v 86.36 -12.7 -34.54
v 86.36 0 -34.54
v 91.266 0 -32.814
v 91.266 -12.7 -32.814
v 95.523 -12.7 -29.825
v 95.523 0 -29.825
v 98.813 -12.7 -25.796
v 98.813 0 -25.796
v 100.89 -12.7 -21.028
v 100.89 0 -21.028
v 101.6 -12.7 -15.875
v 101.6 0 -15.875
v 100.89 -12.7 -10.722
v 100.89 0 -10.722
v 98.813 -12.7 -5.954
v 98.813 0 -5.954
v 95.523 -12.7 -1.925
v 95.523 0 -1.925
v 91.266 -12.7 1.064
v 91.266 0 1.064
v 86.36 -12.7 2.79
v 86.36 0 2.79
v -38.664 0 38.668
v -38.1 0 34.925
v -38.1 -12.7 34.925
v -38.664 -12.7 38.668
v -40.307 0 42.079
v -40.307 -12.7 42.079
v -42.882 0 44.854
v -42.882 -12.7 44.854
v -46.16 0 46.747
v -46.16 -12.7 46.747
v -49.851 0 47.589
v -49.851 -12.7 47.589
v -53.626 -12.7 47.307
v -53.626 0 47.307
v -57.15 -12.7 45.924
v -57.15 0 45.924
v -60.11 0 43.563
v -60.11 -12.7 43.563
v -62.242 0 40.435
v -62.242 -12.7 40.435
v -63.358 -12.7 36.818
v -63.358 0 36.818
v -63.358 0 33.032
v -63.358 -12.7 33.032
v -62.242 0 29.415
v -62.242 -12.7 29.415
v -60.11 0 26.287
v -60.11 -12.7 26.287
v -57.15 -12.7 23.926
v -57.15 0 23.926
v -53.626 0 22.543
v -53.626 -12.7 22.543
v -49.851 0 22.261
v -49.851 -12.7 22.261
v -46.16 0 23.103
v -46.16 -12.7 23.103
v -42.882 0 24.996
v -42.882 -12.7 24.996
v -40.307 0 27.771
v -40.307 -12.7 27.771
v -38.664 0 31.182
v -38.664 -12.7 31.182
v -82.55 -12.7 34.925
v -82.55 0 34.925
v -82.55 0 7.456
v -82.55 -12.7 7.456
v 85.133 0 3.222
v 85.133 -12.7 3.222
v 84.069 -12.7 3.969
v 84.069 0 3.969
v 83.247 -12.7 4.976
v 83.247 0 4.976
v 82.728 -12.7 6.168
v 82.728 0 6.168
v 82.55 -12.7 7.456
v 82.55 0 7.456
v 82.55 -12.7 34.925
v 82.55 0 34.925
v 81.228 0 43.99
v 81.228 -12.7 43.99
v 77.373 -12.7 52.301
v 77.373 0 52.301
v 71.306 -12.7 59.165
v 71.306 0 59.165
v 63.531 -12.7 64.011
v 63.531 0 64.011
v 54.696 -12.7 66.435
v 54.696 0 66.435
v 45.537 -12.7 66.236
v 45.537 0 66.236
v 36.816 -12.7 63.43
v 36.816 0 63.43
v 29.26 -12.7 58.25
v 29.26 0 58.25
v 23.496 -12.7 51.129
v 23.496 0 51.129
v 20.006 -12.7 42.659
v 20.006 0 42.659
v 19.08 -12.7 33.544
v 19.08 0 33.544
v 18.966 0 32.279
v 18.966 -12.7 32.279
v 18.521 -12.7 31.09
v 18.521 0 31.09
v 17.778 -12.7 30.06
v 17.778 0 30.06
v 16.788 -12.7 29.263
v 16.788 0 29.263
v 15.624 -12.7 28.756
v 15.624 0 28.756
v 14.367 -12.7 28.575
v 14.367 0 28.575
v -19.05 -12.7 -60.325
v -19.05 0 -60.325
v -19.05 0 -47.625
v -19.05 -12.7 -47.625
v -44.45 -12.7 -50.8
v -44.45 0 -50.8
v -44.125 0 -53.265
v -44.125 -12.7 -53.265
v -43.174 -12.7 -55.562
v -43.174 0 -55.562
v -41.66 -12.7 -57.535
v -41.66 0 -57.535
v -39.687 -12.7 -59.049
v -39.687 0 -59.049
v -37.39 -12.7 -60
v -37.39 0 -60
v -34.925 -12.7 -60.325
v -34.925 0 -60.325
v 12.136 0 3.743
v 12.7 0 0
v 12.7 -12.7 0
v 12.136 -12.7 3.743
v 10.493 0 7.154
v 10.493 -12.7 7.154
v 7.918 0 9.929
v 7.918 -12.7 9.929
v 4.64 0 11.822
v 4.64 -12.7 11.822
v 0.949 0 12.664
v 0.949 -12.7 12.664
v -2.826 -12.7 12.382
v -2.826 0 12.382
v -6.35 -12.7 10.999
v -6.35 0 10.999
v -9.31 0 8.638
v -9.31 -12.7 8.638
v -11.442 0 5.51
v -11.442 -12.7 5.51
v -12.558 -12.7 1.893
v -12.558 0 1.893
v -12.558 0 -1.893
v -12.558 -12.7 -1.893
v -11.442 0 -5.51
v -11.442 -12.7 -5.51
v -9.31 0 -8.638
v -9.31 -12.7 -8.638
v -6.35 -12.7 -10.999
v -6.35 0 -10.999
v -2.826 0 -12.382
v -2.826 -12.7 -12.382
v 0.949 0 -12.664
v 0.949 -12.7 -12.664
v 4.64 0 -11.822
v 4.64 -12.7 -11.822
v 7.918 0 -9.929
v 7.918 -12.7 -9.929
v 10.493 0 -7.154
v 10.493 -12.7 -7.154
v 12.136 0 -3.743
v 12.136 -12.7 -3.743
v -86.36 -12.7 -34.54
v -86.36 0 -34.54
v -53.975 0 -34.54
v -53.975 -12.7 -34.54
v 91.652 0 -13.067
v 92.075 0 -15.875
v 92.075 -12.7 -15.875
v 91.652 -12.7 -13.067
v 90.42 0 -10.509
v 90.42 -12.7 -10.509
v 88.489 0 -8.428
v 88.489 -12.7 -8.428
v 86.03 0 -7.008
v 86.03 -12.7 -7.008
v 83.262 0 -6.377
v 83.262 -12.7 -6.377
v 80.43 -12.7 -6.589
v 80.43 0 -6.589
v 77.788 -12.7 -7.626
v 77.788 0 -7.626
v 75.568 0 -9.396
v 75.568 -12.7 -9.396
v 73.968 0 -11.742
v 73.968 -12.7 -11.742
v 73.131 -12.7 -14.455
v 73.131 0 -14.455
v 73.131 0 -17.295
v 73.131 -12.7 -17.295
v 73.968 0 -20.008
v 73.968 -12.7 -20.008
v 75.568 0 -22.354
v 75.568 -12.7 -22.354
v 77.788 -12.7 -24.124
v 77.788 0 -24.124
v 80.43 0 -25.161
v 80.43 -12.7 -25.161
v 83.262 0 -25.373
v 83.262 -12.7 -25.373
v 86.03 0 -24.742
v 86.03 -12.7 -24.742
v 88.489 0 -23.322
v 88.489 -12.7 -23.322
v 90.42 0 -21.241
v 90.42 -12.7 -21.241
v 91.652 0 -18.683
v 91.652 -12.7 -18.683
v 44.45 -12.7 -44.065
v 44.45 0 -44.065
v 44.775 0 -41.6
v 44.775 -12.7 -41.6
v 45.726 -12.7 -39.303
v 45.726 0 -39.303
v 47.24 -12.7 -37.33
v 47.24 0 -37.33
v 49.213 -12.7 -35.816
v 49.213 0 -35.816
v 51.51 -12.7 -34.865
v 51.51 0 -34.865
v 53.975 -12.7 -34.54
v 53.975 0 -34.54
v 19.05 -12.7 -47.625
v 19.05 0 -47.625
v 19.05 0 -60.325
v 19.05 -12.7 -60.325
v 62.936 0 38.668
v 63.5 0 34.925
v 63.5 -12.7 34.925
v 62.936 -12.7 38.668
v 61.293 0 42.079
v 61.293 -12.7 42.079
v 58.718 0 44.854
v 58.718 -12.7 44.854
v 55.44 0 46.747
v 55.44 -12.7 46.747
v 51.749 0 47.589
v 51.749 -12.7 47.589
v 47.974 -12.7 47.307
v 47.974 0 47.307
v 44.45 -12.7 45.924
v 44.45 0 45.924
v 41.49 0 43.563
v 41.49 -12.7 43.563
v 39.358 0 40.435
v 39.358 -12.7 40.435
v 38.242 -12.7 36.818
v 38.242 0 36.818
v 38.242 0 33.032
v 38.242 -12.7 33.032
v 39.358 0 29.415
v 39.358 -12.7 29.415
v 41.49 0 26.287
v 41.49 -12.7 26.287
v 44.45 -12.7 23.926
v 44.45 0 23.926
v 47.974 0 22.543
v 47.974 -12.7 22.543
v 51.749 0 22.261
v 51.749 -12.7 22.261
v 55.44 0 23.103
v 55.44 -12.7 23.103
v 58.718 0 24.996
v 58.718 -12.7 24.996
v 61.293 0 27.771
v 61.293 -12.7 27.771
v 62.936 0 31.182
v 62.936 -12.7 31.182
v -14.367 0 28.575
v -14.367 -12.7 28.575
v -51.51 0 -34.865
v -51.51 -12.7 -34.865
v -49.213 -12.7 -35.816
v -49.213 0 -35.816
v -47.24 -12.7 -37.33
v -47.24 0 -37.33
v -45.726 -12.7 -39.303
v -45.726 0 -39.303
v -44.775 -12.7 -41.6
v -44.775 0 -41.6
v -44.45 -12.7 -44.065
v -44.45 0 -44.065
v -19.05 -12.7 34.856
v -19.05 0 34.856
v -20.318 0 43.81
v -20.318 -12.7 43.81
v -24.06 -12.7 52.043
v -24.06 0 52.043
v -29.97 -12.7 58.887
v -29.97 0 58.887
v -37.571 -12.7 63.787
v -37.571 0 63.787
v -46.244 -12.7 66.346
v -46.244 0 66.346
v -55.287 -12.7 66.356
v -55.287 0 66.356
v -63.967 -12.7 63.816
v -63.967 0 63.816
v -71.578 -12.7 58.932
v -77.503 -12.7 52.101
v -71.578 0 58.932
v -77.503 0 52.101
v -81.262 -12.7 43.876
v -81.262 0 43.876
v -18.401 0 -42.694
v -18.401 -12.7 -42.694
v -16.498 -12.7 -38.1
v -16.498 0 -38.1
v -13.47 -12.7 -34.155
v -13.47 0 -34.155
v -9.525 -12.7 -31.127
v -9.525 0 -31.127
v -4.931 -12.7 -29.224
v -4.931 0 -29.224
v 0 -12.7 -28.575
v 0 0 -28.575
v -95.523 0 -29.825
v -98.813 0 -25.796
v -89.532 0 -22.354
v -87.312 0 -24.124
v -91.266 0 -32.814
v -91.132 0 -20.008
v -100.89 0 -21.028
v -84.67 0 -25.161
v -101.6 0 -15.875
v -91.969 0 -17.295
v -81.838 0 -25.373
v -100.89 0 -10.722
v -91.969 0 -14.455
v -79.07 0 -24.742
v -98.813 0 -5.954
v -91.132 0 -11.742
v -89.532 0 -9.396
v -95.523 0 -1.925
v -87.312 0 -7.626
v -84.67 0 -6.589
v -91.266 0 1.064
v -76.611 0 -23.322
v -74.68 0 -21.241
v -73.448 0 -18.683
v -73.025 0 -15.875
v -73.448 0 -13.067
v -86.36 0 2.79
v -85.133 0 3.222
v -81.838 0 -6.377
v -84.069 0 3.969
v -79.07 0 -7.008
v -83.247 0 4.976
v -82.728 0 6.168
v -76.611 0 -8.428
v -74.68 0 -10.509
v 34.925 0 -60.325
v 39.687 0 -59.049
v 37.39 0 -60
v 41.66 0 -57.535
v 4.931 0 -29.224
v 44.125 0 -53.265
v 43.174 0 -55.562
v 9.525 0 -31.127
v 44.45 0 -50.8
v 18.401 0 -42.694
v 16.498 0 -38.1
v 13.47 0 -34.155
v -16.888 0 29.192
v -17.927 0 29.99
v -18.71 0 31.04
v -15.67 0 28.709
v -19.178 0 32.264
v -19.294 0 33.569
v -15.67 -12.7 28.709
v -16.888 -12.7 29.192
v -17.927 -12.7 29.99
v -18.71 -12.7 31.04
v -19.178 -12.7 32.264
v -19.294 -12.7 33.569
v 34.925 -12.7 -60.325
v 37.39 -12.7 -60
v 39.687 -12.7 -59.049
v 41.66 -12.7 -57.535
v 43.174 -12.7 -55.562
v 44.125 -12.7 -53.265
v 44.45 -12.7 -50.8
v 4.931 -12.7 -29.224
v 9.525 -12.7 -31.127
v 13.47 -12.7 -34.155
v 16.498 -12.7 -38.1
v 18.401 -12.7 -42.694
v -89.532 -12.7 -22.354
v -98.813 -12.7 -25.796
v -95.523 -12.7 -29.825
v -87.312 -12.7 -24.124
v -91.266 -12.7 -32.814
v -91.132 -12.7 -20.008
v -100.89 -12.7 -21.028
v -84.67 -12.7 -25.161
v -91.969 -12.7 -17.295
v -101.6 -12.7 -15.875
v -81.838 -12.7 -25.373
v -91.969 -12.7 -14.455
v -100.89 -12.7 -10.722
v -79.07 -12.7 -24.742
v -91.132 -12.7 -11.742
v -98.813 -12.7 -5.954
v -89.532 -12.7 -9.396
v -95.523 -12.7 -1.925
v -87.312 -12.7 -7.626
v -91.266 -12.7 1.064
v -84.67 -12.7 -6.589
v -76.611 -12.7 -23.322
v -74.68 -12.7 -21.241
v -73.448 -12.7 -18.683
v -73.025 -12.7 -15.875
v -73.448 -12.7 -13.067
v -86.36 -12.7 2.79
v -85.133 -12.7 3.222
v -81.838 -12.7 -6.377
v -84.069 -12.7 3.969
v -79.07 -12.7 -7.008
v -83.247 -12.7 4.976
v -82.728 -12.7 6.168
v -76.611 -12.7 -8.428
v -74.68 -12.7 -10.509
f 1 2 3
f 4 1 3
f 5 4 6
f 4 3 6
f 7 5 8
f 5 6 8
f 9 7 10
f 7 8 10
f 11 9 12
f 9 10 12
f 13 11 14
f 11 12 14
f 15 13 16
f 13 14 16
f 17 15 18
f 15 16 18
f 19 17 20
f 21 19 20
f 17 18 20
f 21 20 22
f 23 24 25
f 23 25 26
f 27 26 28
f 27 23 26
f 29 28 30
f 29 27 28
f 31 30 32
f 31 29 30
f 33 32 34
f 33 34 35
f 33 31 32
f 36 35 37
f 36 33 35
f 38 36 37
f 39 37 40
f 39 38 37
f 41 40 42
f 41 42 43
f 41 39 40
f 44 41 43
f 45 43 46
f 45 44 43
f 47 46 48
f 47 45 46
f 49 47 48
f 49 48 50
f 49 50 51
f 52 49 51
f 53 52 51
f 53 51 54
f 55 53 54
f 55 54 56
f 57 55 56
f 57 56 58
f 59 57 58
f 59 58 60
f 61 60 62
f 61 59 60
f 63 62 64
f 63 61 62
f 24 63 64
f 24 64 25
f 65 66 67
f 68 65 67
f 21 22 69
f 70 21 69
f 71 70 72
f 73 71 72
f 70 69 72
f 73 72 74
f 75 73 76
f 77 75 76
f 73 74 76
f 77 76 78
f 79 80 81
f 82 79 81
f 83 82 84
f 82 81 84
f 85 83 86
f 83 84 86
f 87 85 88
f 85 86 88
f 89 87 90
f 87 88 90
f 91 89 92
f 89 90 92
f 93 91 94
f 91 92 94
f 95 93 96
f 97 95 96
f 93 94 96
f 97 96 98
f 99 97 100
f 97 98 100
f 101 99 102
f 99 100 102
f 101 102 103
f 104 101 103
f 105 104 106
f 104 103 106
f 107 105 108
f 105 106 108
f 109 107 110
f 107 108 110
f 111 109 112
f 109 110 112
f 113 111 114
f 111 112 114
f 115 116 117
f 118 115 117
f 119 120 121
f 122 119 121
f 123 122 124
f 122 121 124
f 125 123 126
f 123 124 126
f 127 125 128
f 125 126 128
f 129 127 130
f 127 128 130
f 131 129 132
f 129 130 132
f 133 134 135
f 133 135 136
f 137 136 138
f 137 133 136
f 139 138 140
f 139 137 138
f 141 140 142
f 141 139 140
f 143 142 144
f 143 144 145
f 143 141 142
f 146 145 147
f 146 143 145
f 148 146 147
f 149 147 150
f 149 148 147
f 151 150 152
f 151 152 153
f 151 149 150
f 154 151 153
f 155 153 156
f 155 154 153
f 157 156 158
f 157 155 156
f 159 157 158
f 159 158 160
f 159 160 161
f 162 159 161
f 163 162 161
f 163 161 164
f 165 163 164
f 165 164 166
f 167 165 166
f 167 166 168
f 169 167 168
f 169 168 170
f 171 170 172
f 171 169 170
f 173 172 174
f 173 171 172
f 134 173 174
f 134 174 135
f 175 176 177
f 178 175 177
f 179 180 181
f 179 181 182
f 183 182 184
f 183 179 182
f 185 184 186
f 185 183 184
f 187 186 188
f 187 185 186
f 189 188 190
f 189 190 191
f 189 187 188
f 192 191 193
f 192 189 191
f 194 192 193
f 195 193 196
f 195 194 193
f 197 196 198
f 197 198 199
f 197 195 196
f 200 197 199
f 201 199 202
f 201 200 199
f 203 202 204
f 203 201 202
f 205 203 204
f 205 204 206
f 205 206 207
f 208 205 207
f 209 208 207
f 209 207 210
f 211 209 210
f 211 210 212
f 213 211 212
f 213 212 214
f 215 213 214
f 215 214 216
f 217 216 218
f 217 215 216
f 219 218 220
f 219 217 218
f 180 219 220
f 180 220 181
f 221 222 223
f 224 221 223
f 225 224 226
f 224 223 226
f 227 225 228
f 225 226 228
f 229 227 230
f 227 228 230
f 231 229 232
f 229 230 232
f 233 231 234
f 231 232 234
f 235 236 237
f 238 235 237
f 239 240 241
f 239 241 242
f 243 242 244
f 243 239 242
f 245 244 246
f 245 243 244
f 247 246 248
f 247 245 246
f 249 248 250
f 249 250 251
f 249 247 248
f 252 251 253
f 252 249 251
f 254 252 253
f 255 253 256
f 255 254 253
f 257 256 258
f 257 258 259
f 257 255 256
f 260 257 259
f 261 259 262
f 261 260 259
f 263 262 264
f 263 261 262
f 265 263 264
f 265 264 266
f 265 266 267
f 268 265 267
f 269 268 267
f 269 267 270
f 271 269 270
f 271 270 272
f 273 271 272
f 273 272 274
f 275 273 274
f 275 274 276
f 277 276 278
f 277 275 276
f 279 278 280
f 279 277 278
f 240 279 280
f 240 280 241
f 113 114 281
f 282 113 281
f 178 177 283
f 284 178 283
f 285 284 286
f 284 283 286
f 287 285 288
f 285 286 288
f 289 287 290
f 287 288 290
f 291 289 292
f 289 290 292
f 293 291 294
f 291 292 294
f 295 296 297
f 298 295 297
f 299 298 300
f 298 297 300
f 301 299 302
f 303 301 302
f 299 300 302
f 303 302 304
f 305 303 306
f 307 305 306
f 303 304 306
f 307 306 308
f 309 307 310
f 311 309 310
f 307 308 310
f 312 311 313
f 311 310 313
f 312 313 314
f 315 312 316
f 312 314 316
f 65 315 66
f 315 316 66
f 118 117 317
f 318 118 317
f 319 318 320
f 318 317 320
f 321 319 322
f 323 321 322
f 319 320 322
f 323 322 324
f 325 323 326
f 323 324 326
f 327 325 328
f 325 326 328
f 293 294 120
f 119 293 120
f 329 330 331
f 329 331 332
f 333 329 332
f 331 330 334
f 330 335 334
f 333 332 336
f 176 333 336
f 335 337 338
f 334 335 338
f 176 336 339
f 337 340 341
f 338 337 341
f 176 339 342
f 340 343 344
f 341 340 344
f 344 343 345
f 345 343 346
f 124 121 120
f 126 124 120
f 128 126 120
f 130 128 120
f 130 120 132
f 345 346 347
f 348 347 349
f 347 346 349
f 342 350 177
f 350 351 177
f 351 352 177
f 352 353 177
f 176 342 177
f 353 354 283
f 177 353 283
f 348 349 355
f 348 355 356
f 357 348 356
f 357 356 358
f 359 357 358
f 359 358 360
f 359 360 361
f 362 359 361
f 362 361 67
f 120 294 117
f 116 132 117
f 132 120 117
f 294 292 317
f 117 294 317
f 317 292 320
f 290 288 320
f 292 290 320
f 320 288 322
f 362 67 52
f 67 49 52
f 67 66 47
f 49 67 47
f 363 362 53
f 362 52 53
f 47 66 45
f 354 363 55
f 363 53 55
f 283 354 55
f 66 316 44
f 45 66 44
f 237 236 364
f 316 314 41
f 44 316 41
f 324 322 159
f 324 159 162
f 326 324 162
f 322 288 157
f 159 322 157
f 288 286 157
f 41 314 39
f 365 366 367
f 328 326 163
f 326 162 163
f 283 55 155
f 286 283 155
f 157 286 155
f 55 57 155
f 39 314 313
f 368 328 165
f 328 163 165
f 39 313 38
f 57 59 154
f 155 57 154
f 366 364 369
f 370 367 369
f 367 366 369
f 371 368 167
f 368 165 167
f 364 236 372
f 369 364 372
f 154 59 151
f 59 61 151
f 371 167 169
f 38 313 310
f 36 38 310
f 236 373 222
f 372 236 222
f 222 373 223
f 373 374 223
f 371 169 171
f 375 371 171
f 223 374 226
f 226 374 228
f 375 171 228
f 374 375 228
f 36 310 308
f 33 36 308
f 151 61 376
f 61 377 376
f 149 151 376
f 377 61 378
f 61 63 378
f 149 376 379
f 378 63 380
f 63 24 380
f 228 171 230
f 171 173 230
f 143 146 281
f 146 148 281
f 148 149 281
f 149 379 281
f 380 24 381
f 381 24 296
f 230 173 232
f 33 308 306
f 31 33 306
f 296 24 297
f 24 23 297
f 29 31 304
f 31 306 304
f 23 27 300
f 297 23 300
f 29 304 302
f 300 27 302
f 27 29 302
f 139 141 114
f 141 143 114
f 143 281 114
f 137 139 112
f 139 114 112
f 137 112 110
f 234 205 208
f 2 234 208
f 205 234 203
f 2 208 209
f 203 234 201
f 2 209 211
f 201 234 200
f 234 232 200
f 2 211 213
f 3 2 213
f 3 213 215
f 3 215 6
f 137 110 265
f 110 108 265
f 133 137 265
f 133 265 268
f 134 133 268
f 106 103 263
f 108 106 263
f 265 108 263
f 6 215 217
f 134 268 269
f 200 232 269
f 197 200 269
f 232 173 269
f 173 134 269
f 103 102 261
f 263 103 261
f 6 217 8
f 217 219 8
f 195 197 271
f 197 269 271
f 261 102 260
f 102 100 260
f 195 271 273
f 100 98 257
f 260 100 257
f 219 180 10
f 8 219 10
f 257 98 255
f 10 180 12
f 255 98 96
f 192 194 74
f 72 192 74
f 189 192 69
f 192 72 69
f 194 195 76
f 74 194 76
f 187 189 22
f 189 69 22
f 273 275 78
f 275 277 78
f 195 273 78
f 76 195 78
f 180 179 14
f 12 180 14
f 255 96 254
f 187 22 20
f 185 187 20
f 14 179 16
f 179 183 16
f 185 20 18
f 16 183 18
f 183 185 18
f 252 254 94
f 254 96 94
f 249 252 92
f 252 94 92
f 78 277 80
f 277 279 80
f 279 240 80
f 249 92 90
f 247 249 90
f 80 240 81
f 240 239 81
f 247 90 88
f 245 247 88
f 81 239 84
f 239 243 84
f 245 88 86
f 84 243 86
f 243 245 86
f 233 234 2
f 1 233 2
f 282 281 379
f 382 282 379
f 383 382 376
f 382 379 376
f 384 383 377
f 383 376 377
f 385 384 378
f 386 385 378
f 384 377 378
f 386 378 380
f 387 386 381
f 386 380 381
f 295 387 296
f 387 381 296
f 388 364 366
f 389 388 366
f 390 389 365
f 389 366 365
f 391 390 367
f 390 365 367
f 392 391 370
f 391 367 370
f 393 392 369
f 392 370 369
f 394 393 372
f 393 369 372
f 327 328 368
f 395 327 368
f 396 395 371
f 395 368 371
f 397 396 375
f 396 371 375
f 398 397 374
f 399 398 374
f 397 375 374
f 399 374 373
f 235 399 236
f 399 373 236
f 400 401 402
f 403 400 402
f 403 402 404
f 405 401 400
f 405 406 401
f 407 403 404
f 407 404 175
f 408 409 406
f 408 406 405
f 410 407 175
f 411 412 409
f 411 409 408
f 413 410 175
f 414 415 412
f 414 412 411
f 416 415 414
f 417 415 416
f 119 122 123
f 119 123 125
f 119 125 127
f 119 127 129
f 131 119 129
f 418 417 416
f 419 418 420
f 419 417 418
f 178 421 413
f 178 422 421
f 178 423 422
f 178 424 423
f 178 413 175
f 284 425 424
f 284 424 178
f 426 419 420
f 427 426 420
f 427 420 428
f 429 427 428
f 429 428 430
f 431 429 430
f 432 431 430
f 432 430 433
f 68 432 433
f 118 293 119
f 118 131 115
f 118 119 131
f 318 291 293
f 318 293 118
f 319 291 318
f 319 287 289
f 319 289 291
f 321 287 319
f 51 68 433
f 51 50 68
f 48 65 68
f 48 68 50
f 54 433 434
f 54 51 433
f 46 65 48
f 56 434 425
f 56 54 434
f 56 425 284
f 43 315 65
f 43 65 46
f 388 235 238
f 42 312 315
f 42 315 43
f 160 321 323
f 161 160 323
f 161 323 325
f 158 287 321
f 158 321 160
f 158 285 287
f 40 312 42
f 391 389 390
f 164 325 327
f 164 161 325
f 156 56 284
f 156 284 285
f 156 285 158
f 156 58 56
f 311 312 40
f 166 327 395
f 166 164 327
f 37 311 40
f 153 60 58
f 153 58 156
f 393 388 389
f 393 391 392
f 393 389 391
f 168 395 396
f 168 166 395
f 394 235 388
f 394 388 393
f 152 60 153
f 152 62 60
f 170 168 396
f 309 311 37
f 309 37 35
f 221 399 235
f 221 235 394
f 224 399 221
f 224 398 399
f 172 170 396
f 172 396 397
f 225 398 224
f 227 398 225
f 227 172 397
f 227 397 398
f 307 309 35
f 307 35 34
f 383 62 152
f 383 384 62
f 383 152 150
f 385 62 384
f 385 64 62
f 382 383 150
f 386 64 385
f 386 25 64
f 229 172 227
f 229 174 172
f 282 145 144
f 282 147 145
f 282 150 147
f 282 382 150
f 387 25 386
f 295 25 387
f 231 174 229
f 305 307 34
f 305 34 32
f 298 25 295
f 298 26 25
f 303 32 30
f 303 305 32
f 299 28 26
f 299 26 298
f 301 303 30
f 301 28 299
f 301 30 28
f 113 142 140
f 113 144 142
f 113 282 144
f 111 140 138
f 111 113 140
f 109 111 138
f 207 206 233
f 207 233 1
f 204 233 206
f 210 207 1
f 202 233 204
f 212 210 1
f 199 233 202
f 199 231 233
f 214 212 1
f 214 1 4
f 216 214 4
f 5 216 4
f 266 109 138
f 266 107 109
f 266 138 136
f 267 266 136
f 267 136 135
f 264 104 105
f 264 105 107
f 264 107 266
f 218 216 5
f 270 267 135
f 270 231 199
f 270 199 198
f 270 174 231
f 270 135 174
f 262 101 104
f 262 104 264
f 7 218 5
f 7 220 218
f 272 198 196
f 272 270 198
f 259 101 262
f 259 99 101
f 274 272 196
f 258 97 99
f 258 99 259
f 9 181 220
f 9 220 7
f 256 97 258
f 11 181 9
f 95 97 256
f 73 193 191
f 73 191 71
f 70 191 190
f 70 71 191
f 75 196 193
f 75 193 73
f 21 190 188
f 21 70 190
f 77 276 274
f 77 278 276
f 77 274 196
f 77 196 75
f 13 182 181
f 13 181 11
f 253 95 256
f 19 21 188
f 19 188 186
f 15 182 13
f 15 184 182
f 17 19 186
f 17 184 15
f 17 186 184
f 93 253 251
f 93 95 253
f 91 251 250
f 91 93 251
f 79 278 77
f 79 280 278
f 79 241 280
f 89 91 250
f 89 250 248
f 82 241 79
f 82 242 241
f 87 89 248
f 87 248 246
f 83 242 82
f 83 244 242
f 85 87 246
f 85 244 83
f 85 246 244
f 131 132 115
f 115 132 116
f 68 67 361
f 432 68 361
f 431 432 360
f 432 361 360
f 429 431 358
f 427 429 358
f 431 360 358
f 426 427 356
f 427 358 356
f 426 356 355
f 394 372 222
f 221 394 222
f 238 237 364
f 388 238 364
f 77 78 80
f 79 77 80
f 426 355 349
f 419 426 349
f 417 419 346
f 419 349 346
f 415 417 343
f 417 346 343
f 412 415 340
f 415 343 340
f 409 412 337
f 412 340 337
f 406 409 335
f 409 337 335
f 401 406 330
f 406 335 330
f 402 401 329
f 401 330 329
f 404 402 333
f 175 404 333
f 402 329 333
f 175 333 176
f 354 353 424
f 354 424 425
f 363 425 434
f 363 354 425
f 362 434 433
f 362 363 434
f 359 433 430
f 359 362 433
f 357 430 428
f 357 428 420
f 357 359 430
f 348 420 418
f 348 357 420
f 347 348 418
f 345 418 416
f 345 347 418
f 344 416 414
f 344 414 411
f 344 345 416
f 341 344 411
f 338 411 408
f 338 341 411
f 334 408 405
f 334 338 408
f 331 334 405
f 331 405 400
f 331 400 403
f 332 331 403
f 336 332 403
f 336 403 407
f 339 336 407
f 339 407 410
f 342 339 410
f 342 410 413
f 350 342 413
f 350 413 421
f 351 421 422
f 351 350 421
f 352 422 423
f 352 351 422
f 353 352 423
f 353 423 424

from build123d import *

# Parameters (mm, degrees)
F0_R     = 9.525
F0_R_2   = 12.7
F1_DEPTH = 12.7


with BuildPart() as f1:
    # F0 (on Front) → F1 (new body)
    with BuildSketch(Plane.XZ):
        with BuildLine():
            ThreePointArc((19.080032, 33.544383), (17.7775, 30.059917), (14.366766, 28.575))
            Line((14.366766, 28.575), (-14.366766, 28.575))
            ThreePointArc((-14.366766, 28.575), (-18.355036, 30.487573), (-19.050075, 34.855771))
            ThreePointArc((-19.050075, 34.855771), (-50.765385, 66.674981), (-82.55, 34.925))
            Line((-82.55, 34.925), (-82.55, 7.45639))
            ThreePointArc((-82.55, 7.45639), (-83.623483, 4.44432), (-86.36, 2.790112))
            ThreePointArc((-86.36, 2.790112), (-101.6, -15.875), (-86.36, -34.540112))
            Line((-86.36, -34.540112), (-53.975, -34.540112))
            ThreePointArc((-53.975, -34.540112), (-47.239808, -37.32992), (-44.45, -44.065112))
            Line((-44.45, -44.065112), (-44.45, -50.8))
            ThreePointArc((-44.45, -50.8), (-41.660192, -57.535192), (-34.925, -60.325))
            Line((-34.925, -60.325), (-19.05, -60.325))
            Line((-19.05, -60.325), (-19.05, -47.625))
            ThreePointArc((-19.05, -47.625), (-13.470384, -34.154616), (0, -28.575))
            ThreePointArc((0, -28.575), (13.470384, -34.154616), (19.05, -47.625))
            Line((19.05, -47.625), (19.05, -60.325))
            Line((19.05, -60.325), (34.925, -60.325))
            ThreePointArc((34.925, -60.325), (41.660192, -57.535192), (44.45, -50.8))
            Line((44.45, -50.8), (44.45, -44.065112))
            ThreePointArc((44.45, -44.065112), (47.239808, -37.32992), (53.975, -34.540112))
            Line((53.975, -34.540112), (86.36, -34.540112))
            ThreePointArc((86.36, -34.540112), (101.6, -15.875), (86.36, 2.790112))
            ThreePointArc((86.36, 2.790112), (83.623483, 4.44432), (82.55, 7.45639))
            Line((82.55, 7.45639), (82.55, 34.925))
            ThreePointArc((82.55, 34.925), (50.109528, 66.667491), (19.080032, 33.544383))
        make_face()
        with Locations((-82.55, -15.875)):
            Circle(F0_R, mode=Mode.SUBTRACT)
        Circle(F0_R_2, mode=Mode.SUBTRACT)
        with Locations((82.55, -15.875)):
            Circle(F0_R, mode=Mode.SUBTRACT)
        with Locations((-50.8, 34.925)):
            Circle(F0_R_2, mode=Mode.SUBTRACT)
        with Locations((50.8, 34.925)):
            Circle(F0_R_2, mode=Mode.SUBTRACT)
    extrude(amount=F1_DEPTH)


solid = f1.part
